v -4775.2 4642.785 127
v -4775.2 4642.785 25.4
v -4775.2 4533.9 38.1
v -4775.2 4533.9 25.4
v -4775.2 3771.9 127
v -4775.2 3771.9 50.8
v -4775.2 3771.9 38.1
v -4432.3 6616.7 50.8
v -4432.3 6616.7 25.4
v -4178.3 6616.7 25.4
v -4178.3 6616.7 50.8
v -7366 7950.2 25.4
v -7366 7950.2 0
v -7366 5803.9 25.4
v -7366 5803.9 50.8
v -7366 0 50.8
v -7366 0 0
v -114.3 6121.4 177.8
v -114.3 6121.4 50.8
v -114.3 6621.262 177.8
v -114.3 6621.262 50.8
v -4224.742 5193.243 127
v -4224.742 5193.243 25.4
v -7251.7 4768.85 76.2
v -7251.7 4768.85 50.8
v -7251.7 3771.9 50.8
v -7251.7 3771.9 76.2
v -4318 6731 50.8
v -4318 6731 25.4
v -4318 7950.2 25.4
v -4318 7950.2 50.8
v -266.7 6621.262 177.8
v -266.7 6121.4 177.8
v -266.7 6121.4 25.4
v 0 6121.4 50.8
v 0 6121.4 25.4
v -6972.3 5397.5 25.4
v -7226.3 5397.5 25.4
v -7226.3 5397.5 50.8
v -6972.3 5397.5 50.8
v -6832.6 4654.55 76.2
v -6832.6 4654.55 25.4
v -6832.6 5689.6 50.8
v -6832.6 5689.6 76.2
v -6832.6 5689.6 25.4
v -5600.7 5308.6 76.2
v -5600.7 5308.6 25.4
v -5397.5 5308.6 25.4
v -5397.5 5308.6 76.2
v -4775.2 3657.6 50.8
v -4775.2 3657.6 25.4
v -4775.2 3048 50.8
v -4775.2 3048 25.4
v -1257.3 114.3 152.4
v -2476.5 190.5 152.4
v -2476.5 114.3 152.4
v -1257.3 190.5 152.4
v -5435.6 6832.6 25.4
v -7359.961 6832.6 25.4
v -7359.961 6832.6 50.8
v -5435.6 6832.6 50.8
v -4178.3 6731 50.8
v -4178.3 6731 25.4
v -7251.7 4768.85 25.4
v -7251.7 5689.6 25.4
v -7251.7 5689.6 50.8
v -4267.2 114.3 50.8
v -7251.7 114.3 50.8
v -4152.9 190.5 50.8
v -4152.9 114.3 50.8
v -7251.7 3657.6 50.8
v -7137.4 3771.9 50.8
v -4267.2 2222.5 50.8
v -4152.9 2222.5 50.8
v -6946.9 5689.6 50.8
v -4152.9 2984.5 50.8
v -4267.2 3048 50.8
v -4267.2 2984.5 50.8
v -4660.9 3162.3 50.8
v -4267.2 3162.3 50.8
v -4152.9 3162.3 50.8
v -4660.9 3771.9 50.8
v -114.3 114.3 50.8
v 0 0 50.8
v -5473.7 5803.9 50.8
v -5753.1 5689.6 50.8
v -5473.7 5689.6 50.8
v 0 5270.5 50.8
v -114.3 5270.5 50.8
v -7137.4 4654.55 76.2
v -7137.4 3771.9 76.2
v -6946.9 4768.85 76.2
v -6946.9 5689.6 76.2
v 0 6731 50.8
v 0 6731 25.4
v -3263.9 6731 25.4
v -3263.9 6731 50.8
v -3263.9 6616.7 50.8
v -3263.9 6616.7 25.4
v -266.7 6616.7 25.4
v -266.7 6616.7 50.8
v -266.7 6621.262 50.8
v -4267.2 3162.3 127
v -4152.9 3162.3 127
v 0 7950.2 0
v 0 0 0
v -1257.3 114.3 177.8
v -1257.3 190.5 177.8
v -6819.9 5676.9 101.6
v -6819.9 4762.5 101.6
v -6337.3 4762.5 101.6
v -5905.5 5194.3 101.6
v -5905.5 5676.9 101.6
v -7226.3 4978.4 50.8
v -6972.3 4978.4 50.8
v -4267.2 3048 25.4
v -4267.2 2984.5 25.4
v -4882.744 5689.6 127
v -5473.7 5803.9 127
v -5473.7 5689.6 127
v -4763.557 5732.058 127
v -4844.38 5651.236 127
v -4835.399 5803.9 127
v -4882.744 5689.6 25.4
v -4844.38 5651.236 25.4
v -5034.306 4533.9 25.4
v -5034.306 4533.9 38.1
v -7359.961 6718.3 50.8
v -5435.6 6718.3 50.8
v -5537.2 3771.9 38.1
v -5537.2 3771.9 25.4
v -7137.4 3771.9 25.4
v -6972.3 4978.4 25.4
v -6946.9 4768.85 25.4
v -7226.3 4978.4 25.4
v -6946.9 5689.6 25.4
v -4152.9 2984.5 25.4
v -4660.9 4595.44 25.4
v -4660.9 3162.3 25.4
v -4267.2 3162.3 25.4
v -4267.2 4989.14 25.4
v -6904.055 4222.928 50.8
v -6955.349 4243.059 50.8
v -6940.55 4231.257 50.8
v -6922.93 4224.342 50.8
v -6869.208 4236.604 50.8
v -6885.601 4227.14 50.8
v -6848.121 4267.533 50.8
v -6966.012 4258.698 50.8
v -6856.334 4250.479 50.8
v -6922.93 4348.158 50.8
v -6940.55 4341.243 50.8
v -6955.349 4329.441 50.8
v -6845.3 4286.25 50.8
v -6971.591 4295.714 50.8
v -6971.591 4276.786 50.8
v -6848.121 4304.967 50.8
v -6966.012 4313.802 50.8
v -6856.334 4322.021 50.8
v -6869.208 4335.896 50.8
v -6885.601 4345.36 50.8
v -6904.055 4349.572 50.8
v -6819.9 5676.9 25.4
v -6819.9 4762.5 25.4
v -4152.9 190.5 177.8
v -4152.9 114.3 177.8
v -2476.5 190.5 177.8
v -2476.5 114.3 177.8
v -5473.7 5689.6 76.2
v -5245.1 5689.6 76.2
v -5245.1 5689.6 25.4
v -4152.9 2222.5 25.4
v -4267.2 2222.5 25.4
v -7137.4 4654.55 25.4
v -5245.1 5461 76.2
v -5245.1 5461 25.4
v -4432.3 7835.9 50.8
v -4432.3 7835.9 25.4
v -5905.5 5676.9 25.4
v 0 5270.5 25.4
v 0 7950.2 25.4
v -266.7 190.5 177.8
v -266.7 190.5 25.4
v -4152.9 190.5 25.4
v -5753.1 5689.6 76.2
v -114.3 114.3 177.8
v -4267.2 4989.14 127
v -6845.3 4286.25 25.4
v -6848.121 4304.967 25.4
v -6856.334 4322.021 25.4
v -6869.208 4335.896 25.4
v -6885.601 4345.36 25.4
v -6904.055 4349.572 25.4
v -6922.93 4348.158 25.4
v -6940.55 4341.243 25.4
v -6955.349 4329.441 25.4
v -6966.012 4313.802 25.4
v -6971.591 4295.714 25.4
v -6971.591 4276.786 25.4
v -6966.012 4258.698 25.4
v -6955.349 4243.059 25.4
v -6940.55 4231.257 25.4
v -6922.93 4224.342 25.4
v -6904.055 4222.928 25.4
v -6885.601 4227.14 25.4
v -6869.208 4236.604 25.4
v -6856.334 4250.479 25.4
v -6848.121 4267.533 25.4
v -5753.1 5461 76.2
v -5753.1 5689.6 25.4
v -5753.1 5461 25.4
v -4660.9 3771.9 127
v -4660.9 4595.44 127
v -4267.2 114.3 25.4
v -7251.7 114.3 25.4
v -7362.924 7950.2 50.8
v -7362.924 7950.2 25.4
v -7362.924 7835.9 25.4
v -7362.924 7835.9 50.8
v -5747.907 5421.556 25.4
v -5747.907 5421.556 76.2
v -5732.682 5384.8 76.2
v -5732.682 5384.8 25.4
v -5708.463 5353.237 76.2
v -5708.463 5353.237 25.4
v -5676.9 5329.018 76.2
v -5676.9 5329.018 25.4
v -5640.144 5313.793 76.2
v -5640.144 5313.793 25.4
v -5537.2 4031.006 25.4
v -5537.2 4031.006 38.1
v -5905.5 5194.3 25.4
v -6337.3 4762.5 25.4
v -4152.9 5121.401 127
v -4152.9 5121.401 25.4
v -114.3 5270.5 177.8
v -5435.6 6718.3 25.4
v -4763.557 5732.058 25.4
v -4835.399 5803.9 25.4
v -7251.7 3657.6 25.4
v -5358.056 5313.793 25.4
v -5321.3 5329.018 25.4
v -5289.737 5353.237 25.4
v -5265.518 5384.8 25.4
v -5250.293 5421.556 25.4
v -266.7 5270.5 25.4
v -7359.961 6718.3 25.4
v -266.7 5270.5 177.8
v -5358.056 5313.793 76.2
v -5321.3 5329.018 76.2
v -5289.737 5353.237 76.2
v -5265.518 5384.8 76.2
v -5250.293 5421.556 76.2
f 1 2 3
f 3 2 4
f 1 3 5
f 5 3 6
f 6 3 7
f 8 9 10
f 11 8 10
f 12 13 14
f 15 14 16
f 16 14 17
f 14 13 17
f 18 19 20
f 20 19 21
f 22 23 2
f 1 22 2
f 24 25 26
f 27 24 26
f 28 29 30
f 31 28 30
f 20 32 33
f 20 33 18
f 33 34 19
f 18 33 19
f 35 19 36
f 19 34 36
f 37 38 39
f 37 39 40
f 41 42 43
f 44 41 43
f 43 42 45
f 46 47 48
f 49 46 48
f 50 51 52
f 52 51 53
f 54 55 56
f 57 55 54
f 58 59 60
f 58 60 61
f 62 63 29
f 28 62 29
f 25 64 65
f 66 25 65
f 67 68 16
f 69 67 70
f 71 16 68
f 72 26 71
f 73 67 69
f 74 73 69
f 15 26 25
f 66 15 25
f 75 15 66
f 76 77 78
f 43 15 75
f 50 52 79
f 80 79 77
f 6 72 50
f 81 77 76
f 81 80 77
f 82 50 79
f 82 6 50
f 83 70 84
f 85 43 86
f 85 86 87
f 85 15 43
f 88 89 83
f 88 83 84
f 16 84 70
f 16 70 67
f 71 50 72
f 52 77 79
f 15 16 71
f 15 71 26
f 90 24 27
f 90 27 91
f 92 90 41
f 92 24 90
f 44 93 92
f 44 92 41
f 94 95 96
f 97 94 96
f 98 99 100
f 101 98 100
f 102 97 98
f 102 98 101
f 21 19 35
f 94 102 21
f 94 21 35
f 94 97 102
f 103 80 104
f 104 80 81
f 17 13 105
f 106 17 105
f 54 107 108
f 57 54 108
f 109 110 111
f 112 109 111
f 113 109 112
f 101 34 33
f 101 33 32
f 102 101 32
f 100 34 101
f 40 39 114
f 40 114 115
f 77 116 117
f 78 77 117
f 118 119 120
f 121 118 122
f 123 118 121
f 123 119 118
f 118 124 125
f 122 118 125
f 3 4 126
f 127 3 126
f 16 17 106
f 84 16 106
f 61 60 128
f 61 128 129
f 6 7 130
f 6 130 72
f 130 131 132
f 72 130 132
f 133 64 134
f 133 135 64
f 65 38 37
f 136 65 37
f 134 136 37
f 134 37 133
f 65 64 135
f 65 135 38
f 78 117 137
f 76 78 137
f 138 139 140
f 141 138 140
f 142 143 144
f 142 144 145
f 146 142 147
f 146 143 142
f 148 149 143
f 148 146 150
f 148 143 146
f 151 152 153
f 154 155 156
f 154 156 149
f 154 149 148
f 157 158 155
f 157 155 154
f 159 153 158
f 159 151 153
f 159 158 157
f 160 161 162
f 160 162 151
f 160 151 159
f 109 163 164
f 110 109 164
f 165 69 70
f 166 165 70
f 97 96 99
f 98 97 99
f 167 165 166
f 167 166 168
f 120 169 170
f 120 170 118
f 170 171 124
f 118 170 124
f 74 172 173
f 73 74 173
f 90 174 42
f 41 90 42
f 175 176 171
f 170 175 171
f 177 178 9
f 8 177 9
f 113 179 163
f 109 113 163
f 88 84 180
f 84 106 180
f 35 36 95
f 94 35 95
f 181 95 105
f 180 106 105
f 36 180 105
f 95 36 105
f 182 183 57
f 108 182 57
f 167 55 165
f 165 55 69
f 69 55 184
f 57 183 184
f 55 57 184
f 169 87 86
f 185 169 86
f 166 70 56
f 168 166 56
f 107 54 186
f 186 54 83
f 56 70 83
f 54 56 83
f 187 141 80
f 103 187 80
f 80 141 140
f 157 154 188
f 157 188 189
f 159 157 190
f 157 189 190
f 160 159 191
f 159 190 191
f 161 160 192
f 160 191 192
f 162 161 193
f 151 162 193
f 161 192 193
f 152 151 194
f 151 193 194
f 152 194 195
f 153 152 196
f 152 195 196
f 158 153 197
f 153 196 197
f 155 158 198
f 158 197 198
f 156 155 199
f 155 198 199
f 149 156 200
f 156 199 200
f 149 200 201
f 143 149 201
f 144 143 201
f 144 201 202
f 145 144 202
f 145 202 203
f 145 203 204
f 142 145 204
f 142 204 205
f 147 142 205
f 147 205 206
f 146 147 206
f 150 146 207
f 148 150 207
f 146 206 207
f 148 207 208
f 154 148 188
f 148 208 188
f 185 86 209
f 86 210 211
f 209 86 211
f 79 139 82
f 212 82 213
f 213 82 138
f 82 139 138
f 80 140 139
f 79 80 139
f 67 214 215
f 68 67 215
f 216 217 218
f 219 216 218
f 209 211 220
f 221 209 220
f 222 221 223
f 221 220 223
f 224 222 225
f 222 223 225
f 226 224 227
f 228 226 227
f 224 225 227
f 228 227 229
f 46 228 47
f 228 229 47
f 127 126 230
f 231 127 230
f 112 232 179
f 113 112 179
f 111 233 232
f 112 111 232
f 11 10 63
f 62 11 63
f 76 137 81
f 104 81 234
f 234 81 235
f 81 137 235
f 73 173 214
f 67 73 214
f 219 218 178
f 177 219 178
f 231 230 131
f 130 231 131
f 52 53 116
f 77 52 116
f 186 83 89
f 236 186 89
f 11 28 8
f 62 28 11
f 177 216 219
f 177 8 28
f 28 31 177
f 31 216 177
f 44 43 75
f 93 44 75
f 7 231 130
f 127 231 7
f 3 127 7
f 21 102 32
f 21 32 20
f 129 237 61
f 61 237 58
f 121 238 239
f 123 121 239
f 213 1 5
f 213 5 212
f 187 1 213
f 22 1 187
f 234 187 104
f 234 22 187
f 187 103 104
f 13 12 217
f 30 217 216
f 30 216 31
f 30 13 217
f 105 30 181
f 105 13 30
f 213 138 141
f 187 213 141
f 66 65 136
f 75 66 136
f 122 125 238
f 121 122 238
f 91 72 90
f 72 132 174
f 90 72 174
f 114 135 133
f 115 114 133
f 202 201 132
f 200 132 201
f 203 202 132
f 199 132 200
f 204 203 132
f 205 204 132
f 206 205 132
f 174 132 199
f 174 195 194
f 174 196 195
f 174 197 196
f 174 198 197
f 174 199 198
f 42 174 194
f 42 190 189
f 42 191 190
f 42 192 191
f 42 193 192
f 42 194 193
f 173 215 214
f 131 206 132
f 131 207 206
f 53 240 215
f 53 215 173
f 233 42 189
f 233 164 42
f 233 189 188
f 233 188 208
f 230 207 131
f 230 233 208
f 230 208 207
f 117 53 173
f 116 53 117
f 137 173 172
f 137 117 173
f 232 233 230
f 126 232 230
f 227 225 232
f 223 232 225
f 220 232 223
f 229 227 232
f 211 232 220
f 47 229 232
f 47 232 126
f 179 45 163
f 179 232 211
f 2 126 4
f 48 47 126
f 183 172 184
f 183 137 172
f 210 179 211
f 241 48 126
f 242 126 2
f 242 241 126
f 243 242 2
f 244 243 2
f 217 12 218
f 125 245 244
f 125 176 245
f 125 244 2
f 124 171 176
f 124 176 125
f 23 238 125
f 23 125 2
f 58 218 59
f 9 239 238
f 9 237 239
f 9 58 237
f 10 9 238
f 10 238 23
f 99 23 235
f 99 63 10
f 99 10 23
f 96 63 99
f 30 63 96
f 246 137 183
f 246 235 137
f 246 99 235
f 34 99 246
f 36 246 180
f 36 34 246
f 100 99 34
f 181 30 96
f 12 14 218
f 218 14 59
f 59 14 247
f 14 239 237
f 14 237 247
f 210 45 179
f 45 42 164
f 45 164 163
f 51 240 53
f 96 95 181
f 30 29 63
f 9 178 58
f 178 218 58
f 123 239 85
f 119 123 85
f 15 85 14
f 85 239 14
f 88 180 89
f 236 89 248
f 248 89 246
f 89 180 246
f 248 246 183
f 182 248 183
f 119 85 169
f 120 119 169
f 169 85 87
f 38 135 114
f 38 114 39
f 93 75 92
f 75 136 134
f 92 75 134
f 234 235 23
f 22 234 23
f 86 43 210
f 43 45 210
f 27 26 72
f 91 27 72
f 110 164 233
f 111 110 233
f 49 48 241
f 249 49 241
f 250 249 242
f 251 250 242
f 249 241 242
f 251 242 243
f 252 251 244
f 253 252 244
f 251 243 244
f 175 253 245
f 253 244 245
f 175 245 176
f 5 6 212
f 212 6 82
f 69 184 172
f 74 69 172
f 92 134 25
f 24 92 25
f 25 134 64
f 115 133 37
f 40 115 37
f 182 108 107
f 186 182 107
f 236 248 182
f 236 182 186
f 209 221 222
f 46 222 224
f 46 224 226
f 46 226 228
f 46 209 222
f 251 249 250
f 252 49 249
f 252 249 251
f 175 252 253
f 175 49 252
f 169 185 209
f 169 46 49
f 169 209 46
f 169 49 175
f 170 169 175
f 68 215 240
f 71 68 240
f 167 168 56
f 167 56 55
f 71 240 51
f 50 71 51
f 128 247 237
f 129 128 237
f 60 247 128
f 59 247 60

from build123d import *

# Parameters (mm, degrees)
F0_W      = 7366
F0_H      = 7950.2
F1_DEPTH  = 25.4
F2_W      = 1924.3610328674
F2_H      = 114.3
F3_DEPTH  = 25.4
F4_R      = 63.5
F4_W      = 254
F4_H      = 419.1
F4_R_2    = 44.45
F5_DEPTH  = 25.4
F7_DEPTH  = 50.8
F9_DEPTH  = 76.2
F11_DEPTH = 101.6
F13_DEPTH = 12.7
F16_DEPTH = 50.8
F17_W     = 152.4
F17_H     = 499.8619333267
F18_DEPTH = 152.4
F19_W     = 1219.2
F19_H     = 76.2
F20_DEPTH = 25.4


with BuildPart() as f1:
    # F0 (on Top) → F1 (new body)
    with BuildSketch(Plane.XY):
        with Locations((-3683, 3975.1)):
            Rectangle(F0_W, F0_H)
    extrude(amount=F1_DEPTH)

    # F2 (on face) → F3 (join)
    with BuildSketch(Plane.XY.offset(25.4)):
        Polygon((-7366, 0), (0, 0), (0, 5270.5), (-114.3, 5270.5), (-114.3, 114.3), (-4152.9, 114.3), (-4152.9, 2222.5), (-4267.2, 2222.5), (-4267.2, 114.3), (-7251.7, 114.3), (-7251.7, 3657.6), (-4775.2, 3657.6), (-4775.2, 3048), (-4267.2, 3048), (-4267.2, 2984.5), (-4152.9, 2984.5), (-4152.9, 3162.3), (-4660.9, 3162.3), (-4660.9, 3771.9), (-7251.7, 3771.9), (-7251.7, 5689.6), (-5473.7, 5689.6), (-5473.7, 5803.9), (-7366, 5803.9), (-7366, 3657.6), align=None)
        Polygon((-114.3, 6121.4), (0, 6121.4), (0, 6731), (-3263.9, 6731), (-3263.9, 6616.7), (-114.3, 6616.7), align=None)
        Polygon((-4432.3, 6616.7), (-4178.3, 6616.7), (-4178.3, 6731), (-4318, 6731), (-4318, 7950.2), (-7362.9240081787, 7950.2), (-7362.9240081787, 7835.9), (-4432.3, 7835.9), align=None)
        with Locations((-6397.7805164337, 6775.45)):
            Rectangle(F2_W, F2_H)
    extrude(amount=F3_DEPTH)

    # F4 (on face) → F5 (join)
    with BuildSketch(Plane.XY.offset(25.4)):
        with Locations((-6908.8, 4286.25)):
            Circle(F4_R)
        with Locations((-7099.3, 5187.95)):
            Rectangle(F4_W, F4_H)
        with Locations((-7200.9, 4692.65)):
            Circle(F4_R_2)
    extrude(amount=F5_DEPTH)

    # F6 (on face) → F7 (join)
    with BuildSketch(Plane.XY.offset(25.4)):
        Polygon((-6832.6, 5689.6), (-6946.9, 5689.6), (-6946.9, 4768.85), (-7251.7, 4768.85), (-7251.7, 3771.9), (-7137.4, 3771.9), (-7137.4, 4654.55), (-6832.6, 4654.55), align=None)
    extrude(amount=F7_DEPTH)

    # F8 (on face) → F9 (join)
    with BuildSketch(Plane.XY.offset(25.4)):
        Polygon((-5905.5, 5676.9), (-6819.9, 5676.9), (-6819.9, 4762.5), (-6337.3, 4762.5), (-5905.5, 5194.3), align=None)
    extrude(amount=F9_DEPTH)

    # F10 (on face) → F11 (join)
    with BuildSketch(Plane.XY.offset(25.4)):
        Polygon((-5473.7, 5803.9), (-5473.7, 5689.6), (-4882.7440753805, 5689.6), (-4844.3797213223, 5651.2356459418), (-4763.5574162327, 5732.0579510314), (-4835.3994652013, 5803.9), align=None)
        Polygon((-4775.2, 4597.4), (-4775.2, 3771.9), (-4660.9, 3771.9), (-4660.9, 4595.4400225566), (-4267.2, 4989.1400225566), (-4267.2, 4991.1), (-4265.2400225566, 4991.1), (-4152.9, 5103.4400225566), (-4152.9, 5105.4), (-4152.9, 5121.4005347987), (-4224.7420489686, 5193.2425837673), (-4305.5643540582, 5112.4202786777), (-4775.2, 4642.7846327359), align=None)
        Polygon((-4265.2400225566, 4991.1), (-4267.2, 4989.1400225566), (-4267.2, 3162.3), (-4152.9, 3162.3), (-4152.9, 5103.4400225566), align=None)
        Polygon((-4267.2, 4991.1), (-4267.2, 4989.1400225566), (-4265.2400225566, 4991.1), align=None)
    extrude(amount=F11_DEPTH)

    # F12 (on face) → F13 (join)
    with BuildSketch(Plane.XY.offset(25.4)):
        Polygon((-5537.2, 3771.9), (-4775.2, 3771.9), (-4775.2, 4533.9), (-5034.3056572201, 4533.9), (-5537.2, 4031.0056572201), align=None)
    extrude(amount=F13_DEPTH)

    # F15 (on face) → F16 (join)
    with BuildSketch(Plane.XY.offset(25.4)):
        with BuildLine():
            Line((-5245.1, 5689.6), (-5753.1, 5689.6))
            Line((-5753.1, 5689.6), (-5753.1, 5461))
            ThreePointArc((-5753.1, 5461), (-5708.4630734528, 5353.2369265472), (-5600.7, 5308.6))
            Line((-5600.7, 5308.6), (-5397.5, 5308.6))
            ThreePointArc((-5397.5, 5308.6), (-5289.7369265472, 5353.2369265472), (-5245.1, 5461))
            Line((-5245.1, 5461), (-5245.1, 5689.6))
        make_face()
    extrude(amount=F16_DEPTH)

    # F17 (on face) → F18 (join)
    with BuildSketch(Plane.XY.offset(25.4)):
        Polygon((-266.7, 190.5), (-4152.9, 190.5), (-4152.9, 114.3), (-114.3, 114.3), (-114.3, 190.5), (-114.3, 5270.5), (-266.7, 5270.5), align=None)
        with Locations((-190.5, 6371.3309666634)):
            Rectangle(F17_W, F17_H)
    extrude(amount=F18_DEPTH)

    # F19 (on face) → F20 (cut)
    with BuildSketch(Plane.XY.offset(177.8)):
        with Locations((-1866.9, 152.4)):
            Rectangle(F19_W, F19_H)
    extrude(amount=-F20_DEPTH, mode=Mode.SUBTRACT)


solid = f1.part
